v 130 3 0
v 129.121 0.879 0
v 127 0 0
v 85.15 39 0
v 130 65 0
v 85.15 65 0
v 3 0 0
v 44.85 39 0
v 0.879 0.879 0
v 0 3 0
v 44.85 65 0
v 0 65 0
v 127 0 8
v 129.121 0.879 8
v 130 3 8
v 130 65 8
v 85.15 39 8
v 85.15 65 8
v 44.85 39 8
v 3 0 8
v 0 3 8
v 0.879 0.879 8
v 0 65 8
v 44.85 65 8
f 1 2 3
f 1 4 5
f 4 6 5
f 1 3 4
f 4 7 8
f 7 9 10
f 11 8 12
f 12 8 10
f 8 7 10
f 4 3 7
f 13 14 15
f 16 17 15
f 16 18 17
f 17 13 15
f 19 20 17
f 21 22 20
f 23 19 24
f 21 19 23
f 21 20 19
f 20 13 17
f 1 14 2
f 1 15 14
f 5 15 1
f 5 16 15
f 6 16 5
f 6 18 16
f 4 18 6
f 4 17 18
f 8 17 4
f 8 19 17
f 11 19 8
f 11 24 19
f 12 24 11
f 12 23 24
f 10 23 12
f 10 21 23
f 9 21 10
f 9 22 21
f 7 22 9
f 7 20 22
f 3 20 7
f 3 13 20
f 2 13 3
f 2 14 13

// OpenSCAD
$fn = 32;

// ----------------------------------------------------------------------
// Window plate: 130 x 65 mm, 1 open windows
// ----------------------------------------------------------------------

// --- parameters (mm) ---
profile_height = 8;       // extrusion height
profile_points = 12;      // points of the closed outline

profile = [[0, 3], [0.879, 0.879], [3, 0], [127, 0], [129.121, 0.879], [130, 3], [130, 65], [85.15, 65], [85.15, 39], [44.85, 39], [44.85, 65], [0, 65]];  // single closed polygon, 12 points, counter clockwise

// --- the one profile operation ---
linear_extrude(height = profile_height) polygon(points = profile);
